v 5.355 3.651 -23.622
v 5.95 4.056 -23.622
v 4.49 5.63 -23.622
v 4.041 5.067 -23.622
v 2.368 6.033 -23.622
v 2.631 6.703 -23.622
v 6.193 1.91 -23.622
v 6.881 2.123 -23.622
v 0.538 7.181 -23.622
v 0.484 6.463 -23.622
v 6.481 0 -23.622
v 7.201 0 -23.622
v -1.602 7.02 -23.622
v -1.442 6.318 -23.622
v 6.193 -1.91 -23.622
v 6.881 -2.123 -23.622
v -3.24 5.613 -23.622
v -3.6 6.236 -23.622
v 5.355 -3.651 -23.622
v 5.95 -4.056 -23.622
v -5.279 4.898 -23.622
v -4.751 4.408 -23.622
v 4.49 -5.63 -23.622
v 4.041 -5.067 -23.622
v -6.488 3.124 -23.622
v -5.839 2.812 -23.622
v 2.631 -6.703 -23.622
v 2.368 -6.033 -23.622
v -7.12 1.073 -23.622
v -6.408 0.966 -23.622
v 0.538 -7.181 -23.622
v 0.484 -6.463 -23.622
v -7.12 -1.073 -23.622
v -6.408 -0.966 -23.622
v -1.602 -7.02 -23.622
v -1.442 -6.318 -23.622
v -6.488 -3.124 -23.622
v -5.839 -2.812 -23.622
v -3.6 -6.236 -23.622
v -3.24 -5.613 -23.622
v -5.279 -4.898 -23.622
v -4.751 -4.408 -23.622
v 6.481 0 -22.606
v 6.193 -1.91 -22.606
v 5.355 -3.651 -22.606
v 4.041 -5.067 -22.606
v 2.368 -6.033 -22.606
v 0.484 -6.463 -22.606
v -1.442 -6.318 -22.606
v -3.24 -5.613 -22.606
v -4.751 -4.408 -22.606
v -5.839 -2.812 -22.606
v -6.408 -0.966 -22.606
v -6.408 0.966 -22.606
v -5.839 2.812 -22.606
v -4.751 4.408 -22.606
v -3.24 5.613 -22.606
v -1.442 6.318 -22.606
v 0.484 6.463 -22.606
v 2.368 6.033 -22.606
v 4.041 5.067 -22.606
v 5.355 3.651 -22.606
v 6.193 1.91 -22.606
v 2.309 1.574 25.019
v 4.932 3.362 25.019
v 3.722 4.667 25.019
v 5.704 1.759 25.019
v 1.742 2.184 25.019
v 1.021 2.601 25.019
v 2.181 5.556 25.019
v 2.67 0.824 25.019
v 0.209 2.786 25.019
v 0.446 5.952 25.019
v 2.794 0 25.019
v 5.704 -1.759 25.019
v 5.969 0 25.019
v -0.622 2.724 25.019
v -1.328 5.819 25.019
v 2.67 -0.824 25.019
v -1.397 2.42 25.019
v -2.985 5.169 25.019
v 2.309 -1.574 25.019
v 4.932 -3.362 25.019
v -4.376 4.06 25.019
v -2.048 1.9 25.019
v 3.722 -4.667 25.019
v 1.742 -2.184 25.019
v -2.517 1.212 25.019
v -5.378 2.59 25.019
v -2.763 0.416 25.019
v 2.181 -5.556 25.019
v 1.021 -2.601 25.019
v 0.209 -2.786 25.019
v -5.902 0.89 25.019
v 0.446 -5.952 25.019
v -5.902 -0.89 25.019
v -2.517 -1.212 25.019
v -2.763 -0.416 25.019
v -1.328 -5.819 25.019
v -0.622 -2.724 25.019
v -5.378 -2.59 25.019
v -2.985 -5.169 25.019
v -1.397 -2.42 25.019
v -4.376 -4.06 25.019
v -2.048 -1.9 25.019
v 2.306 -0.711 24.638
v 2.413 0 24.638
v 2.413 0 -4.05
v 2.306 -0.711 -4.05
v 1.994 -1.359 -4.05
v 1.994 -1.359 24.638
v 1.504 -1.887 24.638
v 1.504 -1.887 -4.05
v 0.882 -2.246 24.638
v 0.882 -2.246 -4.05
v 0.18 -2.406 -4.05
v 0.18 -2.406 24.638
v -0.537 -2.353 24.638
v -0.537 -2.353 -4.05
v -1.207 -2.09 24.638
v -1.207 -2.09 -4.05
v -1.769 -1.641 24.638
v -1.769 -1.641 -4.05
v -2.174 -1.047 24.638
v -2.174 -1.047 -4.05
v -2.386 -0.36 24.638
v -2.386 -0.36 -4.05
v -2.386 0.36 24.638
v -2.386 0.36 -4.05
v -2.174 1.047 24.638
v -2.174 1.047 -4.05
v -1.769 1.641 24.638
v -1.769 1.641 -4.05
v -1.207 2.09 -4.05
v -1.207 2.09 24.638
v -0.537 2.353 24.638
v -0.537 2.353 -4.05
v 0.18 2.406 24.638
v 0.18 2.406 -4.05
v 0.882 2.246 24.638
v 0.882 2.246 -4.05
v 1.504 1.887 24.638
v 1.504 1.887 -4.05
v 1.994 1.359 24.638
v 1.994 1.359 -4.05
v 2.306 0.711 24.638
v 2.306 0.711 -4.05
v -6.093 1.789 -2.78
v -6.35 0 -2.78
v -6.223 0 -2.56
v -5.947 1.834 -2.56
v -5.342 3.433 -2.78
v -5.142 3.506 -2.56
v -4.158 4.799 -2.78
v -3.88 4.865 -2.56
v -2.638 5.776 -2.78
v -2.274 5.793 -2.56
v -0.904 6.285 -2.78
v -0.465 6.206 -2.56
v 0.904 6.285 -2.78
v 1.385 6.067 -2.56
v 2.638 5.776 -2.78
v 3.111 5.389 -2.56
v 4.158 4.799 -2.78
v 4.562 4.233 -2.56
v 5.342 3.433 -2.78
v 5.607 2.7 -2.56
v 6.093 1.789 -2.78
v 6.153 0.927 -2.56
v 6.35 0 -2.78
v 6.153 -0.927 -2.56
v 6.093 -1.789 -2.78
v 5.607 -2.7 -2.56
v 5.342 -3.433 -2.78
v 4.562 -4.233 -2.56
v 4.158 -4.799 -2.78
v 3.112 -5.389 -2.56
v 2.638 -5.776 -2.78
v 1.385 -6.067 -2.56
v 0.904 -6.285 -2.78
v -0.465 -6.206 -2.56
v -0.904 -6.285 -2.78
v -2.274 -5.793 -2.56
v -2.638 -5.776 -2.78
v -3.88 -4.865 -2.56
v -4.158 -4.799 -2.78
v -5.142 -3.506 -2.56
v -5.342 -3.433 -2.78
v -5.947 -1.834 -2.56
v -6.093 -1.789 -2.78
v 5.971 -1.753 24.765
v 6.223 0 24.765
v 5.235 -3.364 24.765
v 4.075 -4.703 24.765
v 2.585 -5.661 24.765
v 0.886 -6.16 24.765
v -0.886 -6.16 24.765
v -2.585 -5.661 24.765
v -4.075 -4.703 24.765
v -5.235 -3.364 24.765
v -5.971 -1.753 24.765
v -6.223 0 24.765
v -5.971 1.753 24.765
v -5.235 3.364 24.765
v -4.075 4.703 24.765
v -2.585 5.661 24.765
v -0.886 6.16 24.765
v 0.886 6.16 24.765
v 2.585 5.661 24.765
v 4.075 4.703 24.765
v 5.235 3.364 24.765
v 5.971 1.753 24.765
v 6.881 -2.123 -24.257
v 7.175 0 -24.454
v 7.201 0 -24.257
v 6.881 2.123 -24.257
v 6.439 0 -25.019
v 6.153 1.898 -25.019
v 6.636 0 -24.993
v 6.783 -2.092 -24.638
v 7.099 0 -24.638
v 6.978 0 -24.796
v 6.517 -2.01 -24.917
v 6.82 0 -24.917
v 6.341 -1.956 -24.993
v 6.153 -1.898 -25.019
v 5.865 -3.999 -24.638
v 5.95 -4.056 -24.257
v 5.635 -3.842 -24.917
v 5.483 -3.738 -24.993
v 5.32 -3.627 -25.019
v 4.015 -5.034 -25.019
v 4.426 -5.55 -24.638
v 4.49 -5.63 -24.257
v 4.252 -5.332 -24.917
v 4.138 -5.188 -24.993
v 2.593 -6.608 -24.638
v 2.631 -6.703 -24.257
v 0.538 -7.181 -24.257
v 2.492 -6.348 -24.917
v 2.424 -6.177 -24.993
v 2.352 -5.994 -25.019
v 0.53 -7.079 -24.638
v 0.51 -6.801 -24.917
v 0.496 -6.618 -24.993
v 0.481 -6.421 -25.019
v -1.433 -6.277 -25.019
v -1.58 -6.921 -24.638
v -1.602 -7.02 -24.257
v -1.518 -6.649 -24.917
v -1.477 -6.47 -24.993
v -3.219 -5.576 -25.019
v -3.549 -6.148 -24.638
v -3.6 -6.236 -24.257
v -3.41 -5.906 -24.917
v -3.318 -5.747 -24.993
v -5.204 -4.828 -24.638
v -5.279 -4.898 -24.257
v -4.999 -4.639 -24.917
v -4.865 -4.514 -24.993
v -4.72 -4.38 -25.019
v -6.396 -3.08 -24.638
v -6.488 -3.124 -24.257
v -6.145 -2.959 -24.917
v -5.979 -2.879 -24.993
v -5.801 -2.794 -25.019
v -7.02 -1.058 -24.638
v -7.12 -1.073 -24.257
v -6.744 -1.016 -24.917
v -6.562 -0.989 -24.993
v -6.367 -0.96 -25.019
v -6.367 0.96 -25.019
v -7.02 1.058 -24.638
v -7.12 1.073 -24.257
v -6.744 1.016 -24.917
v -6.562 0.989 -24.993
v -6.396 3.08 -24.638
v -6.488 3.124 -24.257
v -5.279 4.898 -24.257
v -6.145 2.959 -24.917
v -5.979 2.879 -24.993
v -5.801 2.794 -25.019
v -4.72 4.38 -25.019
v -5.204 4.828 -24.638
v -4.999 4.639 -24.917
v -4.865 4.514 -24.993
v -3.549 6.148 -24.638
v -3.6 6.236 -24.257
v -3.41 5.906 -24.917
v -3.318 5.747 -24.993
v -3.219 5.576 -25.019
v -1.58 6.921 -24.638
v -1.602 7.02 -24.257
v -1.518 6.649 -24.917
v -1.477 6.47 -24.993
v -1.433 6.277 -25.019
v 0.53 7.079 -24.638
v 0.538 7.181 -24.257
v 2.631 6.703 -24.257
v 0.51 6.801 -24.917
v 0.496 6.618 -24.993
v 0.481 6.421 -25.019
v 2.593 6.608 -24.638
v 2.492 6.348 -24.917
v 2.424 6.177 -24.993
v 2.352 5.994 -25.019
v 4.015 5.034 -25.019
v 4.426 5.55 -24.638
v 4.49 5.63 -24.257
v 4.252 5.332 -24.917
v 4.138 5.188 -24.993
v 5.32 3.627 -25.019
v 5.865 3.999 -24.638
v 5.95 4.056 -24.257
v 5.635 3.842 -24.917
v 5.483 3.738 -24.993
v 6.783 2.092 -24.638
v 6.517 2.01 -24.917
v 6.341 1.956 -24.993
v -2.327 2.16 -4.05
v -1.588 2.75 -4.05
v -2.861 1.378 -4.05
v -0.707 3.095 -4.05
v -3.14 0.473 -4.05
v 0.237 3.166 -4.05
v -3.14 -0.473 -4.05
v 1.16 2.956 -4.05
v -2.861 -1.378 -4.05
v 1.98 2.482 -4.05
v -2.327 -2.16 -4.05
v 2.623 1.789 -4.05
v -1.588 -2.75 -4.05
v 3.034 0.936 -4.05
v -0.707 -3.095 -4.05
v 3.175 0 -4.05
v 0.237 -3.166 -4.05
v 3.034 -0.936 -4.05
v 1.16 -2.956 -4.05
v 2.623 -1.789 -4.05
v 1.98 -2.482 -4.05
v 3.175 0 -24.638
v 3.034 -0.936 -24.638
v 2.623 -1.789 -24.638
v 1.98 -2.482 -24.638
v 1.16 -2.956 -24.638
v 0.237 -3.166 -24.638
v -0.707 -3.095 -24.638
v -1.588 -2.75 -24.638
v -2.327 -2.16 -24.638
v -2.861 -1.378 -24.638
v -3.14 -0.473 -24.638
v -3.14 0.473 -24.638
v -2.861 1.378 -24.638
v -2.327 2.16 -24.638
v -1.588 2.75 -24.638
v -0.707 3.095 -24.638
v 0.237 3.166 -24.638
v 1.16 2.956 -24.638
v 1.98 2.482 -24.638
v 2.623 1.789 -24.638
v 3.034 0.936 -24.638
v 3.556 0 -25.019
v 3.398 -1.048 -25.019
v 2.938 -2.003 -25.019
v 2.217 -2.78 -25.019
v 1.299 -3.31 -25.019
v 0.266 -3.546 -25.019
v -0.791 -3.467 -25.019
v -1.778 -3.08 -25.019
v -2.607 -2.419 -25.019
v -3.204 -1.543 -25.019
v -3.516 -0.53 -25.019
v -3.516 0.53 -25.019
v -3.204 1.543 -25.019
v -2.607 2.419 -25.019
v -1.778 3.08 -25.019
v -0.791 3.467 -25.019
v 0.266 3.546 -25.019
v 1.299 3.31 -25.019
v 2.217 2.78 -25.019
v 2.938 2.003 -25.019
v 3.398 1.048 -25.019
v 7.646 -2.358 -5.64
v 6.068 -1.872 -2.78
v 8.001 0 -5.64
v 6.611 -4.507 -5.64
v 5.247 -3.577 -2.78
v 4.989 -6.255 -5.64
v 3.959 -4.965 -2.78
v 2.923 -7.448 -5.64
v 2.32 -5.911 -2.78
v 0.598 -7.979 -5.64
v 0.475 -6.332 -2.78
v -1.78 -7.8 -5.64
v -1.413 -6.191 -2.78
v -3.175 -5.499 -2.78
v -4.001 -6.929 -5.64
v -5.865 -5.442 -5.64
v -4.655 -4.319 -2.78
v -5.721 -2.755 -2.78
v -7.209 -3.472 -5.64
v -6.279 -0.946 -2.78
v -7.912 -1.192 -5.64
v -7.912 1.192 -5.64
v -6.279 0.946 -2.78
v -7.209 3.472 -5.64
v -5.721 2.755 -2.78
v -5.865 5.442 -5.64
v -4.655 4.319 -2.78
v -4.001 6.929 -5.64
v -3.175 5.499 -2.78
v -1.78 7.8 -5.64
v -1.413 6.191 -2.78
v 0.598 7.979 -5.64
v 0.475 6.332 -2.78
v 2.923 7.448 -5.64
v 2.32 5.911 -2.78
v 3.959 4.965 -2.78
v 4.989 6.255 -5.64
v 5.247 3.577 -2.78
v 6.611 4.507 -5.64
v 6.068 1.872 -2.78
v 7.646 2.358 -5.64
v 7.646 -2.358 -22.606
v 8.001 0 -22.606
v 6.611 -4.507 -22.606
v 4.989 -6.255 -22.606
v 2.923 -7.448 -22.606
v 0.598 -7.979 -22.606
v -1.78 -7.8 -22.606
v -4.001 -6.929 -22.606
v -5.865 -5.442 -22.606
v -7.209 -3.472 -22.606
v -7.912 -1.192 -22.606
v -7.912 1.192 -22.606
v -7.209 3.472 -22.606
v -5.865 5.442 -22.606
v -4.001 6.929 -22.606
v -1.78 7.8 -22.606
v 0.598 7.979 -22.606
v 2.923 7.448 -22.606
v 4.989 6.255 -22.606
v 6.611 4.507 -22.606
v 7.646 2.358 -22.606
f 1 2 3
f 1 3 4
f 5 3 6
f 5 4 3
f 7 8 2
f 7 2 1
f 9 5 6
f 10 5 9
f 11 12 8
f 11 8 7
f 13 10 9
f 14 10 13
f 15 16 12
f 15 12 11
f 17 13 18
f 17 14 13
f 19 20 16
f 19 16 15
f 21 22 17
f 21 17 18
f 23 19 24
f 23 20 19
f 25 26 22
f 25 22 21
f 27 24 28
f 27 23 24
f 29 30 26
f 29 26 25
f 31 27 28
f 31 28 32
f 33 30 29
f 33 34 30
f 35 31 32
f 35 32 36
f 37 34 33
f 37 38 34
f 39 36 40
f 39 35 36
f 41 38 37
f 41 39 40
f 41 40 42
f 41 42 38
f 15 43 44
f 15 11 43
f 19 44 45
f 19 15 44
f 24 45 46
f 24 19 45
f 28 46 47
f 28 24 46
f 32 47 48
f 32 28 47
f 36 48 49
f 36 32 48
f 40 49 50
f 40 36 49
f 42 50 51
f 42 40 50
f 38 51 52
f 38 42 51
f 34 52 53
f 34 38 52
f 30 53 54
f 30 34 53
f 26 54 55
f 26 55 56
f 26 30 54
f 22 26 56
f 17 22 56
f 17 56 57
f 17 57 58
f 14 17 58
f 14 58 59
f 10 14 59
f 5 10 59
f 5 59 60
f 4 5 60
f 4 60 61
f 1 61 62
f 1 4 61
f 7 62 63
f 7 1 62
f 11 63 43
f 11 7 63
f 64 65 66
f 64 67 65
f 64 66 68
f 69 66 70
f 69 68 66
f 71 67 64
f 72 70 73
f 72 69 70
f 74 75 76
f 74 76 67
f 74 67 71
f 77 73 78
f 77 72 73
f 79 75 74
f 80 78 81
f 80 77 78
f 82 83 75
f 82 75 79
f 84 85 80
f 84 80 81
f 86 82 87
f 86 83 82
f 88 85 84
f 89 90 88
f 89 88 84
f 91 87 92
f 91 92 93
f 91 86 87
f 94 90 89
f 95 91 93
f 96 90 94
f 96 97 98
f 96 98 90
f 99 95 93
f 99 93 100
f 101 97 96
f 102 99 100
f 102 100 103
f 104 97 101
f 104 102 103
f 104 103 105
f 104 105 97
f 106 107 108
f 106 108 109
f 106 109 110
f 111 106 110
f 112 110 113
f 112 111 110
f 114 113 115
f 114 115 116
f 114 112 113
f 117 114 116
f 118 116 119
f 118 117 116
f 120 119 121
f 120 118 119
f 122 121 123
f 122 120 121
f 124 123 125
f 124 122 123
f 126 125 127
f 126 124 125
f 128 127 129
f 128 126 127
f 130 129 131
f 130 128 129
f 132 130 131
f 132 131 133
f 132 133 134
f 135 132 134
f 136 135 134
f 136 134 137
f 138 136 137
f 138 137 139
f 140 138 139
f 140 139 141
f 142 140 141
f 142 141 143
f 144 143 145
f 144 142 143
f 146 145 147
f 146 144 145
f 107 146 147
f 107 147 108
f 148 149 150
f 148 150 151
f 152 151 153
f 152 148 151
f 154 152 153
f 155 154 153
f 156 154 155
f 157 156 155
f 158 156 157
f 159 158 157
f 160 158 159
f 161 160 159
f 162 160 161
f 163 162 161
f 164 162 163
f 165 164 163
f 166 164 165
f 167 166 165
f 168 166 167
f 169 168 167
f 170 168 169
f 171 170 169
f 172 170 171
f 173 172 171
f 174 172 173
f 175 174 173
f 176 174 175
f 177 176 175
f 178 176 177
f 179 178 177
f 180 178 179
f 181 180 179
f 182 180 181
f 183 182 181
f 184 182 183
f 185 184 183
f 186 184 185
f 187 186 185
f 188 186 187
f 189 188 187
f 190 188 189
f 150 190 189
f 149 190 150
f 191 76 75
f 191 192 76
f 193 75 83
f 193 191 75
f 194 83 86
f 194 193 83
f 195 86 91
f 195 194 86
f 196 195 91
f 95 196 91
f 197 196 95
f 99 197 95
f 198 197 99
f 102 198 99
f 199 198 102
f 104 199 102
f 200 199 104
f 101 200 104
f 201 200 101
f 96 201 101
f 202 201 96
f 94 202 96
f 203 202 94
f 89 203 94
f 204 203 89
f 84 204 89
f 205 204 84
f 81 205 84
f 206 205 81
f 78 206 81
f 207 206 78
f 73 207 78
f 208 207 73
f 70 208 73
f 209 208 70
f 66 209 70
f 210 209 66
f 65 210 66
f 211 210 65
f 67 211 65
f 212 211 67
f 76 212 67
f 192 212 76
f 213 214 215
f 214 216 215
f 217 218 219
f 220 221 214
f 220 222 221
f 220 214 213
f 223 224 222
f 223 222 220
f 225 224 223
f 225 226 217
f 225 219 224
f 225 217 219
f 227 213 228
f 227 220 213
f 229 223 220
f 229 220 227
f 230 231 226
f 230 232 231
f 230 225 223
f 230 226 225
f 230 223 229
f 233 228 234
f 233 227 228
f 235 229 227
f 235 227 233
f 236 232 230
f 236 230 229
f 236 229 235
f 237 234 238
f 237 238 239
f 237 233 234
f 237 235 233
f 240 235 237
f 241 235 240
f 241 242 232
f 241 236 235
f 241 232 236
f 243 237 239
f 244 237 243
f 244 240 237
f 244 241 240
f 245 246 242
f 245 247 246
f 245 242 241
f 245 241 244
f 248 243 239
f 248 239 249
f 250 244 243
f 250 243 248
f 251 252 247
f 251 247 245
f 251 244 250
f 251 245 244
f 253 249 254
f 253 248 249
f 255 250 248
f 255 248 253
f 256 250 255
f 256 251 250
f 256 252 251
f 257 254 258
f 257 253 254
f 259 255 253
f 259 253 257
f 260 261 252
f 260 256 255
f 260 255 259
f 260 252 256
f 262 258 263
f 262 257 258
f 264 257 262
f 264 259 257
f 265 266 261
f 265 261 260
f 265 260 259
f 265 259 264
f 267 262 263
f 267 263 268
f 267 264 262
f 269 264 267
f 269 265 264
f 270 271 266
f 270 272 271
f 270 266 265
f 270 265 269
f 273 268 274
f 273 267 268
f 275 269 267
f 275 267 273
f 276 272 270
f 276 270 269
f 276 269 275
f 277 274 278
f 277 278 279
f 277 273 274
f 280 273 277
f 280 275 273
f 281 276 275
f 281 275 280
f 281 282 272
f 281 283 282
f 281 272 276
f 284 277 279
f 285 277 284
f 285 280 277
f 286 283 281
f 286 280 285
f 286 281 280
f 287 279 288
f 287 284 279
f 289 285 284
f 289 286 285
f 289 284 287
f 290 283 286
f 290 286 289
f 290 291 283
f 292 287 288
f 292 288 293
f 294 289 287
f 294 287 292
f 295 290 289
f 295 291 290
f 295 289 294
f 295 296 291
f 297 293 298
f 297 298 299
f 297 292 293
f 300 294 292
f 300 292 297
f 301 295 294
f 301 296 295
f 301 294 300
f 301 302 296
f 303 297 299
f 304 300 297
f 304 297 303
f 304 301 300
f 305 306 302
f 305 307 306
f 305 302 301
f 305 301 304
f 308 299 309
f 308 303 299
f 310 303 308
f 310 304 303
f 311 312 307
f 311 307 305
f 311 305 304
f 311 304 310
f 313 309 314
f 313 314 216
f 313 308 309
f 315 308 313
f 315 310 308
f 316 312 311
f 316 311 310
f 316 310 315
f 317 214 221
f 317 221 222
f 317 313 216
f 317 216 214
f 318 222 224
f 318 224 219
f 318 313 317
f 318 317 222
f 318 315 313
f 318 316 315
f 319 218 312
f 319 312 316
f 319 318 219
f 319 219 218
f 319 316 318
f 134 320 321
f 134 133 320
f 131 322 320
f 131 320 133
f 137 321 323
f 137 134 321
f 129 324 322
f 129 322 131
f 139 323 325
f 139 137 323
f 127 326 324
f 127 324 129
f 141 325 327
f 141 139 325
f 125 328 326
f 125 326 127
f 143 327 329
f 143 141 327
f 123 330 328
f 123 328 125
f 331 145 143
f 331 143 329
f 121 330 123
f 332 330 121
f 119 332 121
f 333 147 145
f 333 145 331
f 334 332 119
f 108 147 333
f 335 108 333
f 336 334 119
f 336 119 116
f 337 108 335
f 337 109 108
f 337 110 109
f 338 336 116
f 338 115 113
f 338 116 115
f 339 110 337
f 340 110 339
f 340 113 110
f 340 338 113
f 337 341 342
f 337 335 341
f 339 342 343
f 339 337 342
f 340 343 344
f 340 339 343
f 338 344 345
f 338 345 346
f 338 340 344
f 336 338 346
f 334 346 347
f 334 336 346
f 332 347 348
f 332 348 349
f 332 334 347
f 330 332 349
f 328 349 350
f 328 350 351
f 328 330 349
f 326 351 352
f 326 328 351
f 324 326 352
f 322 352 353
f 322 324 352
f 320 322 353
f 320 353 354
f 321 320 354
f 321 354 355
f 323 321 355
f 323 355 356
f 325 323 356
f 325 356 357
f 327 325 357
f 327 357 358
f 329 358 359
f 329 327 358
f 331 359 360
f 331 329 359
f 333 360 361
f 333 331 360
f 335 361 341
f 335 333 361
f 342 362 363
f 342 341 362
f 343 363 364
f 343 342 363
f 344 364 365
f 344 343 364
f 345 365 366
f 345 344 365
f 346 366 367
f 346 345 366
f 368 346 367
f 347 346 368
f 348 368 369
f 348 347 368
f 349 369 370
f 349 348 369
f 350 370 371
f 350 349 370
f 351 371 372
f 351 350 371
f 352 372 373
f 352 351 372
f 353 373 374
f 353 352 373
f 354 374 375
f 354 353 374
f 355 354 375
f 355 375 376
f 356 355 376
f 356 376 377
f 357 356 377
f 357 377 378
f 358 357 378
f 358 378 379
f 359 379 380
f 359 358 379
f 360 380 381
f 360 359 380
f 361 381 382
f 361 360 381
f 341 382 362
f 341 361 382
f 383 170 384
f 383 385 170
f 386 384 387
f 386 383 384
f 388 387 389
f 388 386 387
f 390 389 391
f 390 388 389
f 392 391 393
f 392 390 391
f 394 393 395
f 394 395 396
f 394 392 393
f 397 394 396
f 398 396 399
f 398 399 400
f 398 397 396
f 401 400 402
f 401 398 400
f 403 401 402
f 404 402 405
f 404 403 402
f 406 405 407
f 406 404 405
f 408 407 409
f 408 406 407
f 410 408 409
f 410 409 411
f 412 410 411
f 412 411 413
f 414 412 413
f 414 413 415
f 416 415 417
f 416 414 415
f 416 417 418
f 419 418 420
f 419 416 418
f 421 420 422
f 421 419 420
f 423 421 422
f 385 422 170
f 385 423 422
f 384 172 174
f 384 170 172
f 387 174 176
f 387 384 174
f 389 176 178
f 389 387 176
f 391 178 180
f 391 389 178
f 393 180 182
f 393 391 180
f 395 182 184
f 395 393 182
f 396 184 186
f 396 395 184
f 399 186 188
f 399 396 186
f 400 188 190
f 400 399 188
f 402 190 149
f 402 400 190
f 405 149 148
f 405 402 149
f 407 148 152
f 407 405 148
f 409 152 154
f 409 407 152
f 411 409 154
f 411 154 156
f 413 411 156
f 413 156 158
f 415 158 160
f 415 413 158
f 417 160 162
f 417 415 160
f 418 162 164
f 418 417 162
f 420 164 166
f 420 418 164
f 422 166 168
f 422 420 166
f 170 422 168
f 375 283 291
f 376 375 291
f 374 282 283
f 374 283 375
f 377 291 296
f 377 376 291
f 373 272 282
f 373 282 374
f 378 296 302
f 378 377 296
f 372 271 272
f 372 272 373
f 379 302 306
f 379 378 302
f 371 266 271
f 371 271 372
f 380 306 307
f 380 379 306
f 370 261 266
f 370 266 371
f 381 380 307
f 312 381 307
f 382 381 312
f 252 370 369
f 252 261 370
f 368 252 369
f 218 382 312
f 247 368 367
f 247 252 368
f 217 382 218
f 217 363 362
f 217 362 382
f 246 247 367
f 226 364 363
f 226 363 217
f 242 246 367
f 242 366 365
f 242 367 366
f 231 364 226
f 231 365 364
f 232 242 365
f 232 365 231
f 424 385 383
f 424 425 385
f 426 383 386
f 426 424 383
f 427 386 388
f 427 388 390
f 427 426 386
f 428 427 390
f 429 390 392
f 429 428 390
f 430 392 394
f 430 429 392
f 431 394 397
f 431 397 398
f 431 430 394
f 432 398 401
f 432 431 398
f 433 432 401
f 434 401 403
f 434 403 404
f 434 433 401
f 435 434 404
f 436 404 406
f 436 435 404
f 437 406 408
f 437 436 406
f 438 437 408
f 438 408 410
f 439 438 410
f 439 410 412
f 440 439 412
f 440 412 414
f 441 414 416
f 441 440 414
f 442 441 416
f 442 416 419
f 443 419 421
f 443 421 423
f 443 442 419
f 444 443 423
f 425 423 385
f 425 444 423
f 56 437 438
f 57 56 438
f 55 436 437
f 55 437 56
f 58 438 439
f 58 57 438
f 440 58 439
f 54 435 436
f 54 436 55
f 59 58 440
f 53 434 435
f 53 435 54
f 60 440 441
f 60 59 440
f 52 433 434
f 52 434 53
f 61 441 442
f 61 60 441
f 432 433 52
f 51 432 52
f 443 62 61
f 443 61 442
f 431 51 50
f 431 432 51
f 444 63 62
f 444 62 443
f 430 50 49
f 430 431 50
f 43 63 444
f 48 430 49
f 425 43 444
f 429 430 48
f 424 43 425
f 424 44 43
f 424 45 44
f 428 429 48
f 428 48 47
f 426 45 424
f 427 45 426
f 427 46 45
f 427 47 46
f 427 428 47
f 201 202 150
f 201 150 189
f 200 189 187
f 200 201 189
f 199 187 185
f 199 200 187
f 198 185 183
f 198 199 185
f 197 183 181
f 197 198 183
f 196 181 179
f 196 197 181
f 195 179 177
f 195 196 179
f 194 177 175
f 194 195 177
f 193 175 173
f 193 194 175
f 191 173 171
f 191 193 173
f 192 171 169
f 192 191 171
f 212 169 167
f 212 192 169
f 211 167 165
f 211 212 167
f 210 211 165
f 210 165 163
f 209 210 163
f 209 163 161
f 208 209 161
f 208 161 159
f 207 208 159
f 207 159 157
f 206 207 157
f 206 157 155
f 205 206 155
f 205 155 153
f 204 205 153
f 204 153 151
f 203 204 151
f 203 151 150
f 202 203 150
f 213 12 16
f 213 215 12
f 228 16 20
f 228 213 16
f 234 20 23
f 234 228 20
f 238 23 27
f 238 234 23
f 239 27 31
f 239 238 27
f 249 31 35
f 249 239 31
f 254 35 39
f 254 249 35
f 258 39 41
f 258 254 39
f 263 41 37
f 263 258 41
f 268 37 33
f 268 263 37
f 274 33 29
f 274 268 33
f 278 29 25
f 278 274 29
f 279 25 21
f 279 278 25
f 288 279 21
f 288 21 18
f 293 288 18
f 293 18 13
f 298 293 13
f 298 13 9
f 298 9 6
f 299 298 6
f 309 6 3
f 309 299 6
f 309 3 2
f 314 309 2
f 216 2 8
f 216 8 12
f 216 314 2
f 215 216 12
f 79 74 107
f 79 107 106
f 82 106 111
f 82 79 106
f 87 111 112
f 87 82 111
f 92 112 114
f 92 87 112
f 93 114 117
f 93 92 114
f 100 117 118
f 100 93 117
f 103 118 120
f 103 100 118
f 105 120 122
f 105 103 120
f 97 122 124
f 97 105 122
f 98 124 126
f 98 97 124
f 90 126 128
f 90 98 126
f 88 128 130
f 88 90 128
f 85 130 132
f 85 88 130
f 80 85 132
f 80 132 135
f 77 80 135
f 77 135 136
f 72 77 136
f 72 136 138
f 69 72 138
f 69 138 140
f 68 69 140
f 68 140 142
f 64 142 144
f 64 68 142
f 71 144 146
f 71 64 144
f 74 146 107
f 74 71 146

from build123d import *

# Parameters (mm, degrees)
CHAMFER1_SIZE      = 0.381
CUT_EXTRUDE1_REACH = 53.301
SKETCH2_R          = 6.35
SKETCH2_R_2        = 6.223


with BuildPart() as part:
    # Sketch1 → Revolve1 (revolve)
    with BuildSketch(Plane(origin=(0, 0, 0), x_dir=(0, 0, -1), z_dir=(1, 0, 0)), mode=Mode.PRIVATE) as revolve1_sk:
        with BuildLine():
            Line((23.622, 7.2009), (24.257, 7.2009))
            ThreePointArc((24.257, 7.2009), (24.795815367, 6.977715367), (25.019, 6.4389))
            Line((25.019, 6.4389), (25.019, 3.556))
            Line((25.019, 3.556), (24.638, 3.175))
            Line((24.638, 3.175), (4.049888889, 3.175))
            Line((4.049888889, 3.175), (4.049888889, 2.413))
            Line((4.049888889, 2.413), (-25.019, 2.413))
            Line((-25.019, 2.413), (-25.019, 6.35))
            Line((-25.019, 6.35), (2.779888889, 6.35))
            Line((2.779888889, 6.35), (5.639504772, 8.001))
            Line((5.639504772, 8.001), (22.606, 8.001))
            Line((22.606, 8.001), (22.606, 6.48081))
            Line((22.606, 6.48081), (23.622, 6.48081))
            Line((23.622, 6.48081), (23.622, 7.2009))
        make_face()
    revolve(revolve1_sk.sketch.rotate(Axis((0, 0, 0), (0, 0, -1)), 90), axis=Axis((0, 0, 0), (0, 0, -1)))

    # Chamfer1
    chamfer1_edges = [part.edges().sort_by_distance(p)[0] for p in [
        (-6.35, 0, 25.019),
        (-2.413, 0, 25.019),
    ]]
    chamfer(chamfer1_edges, length=CHAMFER1_SIZE)

    # Cut-Extrude1: up to this cone (the profile starts outside it)
    cut_extrude1_end = Plane(origin=(0, 0, 25.019), z_dir=(0, 0, -1)).offset(16.800367261) * Cone(1e-06, 21.362325849, 37.000632739, align=(Align.CENTER, Align.CENTER, Align.MIN), mode=Mode.PRIVATE)
    # Sketch2 → Cut-Extrude1 (cut, up to the surface)
    with BuildSketch(Plane.XY.offset(25.019), mode=Mode.PRIVATE) as cut_extrude1_sk1:
        Circle(SKETCH2_R)
        with Locations(Location((0, 0, 0), (0, 0, 180))):
            Circle(SKETCH2_R_2, mode=Mode.SUBTRACT)
    cut_extrude1_tool1 = extrude(cut_extrude1_sk1.sketch, amount=-CUT_EXTRUDE1_REACH, mode=Mode.PRIVATE) - cut_extrude1_end
    add(cut_extrude1_tool1.solids().sort_by_distance((-6.332039, 0, 25.019))[0], mode=Mode.SUBTRACT)


solid = part.part
